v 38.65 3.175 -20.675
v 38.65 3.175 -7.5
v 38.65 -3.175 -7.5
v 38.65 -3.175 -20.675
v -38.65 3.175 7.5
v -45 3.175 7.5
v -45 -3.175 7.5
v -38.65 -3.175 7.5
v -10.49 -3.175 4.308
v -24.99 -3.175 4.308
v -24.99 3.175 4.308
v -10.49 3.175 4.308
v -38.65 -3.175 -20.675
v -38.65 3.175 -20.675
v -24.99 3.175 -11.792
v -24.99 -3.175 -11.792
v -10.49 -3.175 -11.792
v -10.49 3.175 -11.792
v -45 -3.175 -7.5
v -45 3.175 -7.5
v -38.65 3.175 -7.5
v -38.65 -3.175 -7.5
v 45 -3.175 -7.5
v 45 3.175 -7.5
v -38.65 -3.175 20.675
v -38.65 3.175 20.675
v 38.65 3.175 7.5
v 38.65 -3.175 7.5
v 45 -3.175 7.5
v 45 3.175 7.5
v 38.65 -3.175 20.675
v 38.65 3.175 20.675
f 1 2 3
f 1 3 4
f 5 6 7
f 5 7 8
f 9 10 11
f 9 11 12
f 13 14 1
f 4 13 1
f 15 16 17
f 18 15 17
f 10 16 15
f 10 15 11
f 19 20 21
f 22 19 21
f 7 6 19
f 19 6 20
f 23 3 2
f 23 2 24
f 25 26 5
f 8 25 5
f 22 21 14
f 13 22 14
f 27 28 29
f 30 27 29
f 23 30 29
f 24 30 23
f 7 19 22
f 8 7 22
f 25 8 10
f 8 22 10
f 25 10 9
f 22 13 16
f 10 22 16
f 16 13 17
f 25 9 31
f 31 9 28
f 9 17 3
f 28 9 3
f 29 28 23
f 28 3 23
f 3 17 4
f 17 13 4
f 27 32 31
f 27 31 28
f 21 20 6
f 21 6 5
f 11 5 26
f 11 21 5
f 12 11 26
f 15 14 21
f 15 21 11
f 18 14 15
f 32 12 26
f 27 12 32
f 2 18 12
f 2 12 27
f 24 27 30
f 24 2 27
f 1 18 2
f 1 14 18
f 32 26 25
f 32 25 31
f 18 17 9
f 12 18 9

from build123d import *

# Parameters (mm, degrees)
SKETCH1_W           = 90
SKETCH1_H           = 41.35
BOSS_EXTRUDE1_DEPTH = 3.175
SKETCH3_W           = 6.35
SKETCH3_H           = 13.175
LEFTRIGHT_DEPTH     = 50.927729019
SKETCH4_W           = 14.5
SKETCH4_H           = 16.1
RIGHT_DEPTH         = 50.927729019


with BuildPart() as part:
    # Sketch1 → Boss-Extrude1 (new, symmetric)
    with BuildSketch(Plane(origin=(0, 0, 0), x_dir=(1, 0, 0), z_dir=(0, 1, 0))):
        Rectangle(SKETCH1_W, SKETCH1_H)
    extrude(amount=BOSS_EXTRUDE1_DEPTH, both=True)

    # Sketch3 → LeftRight (cut, through all)
    with BuildSketch(Plane(origin=(0, 3.175, 0), x_dir=(1, 0, 0), z_dir=(0, 1, 0))):
        with Locations((-41.825, -14.0875)):
            Rectangle(SKETCH3_W, SKETCH3_H)
        with Locations((-41.825, 14.0875)):
            Rectangle(SKETCH3_W, SKETCH3_H)
        with Locations((41.825, 14.0875)):
            Rectangle(SKETCH3_W, SKETCH3_H)
        with Locations((41.825, -14.0875)):
            Rectangle(SKETCH3_W, SKETCH3_H)
    extrude(amount=-LEFTRIGHT_DEPTH, mode=Mode.SUBTRACT)

    # Sketch4 → Right (cut, through all)
    with BuildSketch(Plane.XZ.offset(3.175)):
        with Locations((-17.74, -3.742440275)):
            Rectangle(SKETCH4_W, SKETCH4_H)
    extrude(amount=-RIGHT_DEPTH, mode=Mode.SUBTRACT)


solid = part.part
